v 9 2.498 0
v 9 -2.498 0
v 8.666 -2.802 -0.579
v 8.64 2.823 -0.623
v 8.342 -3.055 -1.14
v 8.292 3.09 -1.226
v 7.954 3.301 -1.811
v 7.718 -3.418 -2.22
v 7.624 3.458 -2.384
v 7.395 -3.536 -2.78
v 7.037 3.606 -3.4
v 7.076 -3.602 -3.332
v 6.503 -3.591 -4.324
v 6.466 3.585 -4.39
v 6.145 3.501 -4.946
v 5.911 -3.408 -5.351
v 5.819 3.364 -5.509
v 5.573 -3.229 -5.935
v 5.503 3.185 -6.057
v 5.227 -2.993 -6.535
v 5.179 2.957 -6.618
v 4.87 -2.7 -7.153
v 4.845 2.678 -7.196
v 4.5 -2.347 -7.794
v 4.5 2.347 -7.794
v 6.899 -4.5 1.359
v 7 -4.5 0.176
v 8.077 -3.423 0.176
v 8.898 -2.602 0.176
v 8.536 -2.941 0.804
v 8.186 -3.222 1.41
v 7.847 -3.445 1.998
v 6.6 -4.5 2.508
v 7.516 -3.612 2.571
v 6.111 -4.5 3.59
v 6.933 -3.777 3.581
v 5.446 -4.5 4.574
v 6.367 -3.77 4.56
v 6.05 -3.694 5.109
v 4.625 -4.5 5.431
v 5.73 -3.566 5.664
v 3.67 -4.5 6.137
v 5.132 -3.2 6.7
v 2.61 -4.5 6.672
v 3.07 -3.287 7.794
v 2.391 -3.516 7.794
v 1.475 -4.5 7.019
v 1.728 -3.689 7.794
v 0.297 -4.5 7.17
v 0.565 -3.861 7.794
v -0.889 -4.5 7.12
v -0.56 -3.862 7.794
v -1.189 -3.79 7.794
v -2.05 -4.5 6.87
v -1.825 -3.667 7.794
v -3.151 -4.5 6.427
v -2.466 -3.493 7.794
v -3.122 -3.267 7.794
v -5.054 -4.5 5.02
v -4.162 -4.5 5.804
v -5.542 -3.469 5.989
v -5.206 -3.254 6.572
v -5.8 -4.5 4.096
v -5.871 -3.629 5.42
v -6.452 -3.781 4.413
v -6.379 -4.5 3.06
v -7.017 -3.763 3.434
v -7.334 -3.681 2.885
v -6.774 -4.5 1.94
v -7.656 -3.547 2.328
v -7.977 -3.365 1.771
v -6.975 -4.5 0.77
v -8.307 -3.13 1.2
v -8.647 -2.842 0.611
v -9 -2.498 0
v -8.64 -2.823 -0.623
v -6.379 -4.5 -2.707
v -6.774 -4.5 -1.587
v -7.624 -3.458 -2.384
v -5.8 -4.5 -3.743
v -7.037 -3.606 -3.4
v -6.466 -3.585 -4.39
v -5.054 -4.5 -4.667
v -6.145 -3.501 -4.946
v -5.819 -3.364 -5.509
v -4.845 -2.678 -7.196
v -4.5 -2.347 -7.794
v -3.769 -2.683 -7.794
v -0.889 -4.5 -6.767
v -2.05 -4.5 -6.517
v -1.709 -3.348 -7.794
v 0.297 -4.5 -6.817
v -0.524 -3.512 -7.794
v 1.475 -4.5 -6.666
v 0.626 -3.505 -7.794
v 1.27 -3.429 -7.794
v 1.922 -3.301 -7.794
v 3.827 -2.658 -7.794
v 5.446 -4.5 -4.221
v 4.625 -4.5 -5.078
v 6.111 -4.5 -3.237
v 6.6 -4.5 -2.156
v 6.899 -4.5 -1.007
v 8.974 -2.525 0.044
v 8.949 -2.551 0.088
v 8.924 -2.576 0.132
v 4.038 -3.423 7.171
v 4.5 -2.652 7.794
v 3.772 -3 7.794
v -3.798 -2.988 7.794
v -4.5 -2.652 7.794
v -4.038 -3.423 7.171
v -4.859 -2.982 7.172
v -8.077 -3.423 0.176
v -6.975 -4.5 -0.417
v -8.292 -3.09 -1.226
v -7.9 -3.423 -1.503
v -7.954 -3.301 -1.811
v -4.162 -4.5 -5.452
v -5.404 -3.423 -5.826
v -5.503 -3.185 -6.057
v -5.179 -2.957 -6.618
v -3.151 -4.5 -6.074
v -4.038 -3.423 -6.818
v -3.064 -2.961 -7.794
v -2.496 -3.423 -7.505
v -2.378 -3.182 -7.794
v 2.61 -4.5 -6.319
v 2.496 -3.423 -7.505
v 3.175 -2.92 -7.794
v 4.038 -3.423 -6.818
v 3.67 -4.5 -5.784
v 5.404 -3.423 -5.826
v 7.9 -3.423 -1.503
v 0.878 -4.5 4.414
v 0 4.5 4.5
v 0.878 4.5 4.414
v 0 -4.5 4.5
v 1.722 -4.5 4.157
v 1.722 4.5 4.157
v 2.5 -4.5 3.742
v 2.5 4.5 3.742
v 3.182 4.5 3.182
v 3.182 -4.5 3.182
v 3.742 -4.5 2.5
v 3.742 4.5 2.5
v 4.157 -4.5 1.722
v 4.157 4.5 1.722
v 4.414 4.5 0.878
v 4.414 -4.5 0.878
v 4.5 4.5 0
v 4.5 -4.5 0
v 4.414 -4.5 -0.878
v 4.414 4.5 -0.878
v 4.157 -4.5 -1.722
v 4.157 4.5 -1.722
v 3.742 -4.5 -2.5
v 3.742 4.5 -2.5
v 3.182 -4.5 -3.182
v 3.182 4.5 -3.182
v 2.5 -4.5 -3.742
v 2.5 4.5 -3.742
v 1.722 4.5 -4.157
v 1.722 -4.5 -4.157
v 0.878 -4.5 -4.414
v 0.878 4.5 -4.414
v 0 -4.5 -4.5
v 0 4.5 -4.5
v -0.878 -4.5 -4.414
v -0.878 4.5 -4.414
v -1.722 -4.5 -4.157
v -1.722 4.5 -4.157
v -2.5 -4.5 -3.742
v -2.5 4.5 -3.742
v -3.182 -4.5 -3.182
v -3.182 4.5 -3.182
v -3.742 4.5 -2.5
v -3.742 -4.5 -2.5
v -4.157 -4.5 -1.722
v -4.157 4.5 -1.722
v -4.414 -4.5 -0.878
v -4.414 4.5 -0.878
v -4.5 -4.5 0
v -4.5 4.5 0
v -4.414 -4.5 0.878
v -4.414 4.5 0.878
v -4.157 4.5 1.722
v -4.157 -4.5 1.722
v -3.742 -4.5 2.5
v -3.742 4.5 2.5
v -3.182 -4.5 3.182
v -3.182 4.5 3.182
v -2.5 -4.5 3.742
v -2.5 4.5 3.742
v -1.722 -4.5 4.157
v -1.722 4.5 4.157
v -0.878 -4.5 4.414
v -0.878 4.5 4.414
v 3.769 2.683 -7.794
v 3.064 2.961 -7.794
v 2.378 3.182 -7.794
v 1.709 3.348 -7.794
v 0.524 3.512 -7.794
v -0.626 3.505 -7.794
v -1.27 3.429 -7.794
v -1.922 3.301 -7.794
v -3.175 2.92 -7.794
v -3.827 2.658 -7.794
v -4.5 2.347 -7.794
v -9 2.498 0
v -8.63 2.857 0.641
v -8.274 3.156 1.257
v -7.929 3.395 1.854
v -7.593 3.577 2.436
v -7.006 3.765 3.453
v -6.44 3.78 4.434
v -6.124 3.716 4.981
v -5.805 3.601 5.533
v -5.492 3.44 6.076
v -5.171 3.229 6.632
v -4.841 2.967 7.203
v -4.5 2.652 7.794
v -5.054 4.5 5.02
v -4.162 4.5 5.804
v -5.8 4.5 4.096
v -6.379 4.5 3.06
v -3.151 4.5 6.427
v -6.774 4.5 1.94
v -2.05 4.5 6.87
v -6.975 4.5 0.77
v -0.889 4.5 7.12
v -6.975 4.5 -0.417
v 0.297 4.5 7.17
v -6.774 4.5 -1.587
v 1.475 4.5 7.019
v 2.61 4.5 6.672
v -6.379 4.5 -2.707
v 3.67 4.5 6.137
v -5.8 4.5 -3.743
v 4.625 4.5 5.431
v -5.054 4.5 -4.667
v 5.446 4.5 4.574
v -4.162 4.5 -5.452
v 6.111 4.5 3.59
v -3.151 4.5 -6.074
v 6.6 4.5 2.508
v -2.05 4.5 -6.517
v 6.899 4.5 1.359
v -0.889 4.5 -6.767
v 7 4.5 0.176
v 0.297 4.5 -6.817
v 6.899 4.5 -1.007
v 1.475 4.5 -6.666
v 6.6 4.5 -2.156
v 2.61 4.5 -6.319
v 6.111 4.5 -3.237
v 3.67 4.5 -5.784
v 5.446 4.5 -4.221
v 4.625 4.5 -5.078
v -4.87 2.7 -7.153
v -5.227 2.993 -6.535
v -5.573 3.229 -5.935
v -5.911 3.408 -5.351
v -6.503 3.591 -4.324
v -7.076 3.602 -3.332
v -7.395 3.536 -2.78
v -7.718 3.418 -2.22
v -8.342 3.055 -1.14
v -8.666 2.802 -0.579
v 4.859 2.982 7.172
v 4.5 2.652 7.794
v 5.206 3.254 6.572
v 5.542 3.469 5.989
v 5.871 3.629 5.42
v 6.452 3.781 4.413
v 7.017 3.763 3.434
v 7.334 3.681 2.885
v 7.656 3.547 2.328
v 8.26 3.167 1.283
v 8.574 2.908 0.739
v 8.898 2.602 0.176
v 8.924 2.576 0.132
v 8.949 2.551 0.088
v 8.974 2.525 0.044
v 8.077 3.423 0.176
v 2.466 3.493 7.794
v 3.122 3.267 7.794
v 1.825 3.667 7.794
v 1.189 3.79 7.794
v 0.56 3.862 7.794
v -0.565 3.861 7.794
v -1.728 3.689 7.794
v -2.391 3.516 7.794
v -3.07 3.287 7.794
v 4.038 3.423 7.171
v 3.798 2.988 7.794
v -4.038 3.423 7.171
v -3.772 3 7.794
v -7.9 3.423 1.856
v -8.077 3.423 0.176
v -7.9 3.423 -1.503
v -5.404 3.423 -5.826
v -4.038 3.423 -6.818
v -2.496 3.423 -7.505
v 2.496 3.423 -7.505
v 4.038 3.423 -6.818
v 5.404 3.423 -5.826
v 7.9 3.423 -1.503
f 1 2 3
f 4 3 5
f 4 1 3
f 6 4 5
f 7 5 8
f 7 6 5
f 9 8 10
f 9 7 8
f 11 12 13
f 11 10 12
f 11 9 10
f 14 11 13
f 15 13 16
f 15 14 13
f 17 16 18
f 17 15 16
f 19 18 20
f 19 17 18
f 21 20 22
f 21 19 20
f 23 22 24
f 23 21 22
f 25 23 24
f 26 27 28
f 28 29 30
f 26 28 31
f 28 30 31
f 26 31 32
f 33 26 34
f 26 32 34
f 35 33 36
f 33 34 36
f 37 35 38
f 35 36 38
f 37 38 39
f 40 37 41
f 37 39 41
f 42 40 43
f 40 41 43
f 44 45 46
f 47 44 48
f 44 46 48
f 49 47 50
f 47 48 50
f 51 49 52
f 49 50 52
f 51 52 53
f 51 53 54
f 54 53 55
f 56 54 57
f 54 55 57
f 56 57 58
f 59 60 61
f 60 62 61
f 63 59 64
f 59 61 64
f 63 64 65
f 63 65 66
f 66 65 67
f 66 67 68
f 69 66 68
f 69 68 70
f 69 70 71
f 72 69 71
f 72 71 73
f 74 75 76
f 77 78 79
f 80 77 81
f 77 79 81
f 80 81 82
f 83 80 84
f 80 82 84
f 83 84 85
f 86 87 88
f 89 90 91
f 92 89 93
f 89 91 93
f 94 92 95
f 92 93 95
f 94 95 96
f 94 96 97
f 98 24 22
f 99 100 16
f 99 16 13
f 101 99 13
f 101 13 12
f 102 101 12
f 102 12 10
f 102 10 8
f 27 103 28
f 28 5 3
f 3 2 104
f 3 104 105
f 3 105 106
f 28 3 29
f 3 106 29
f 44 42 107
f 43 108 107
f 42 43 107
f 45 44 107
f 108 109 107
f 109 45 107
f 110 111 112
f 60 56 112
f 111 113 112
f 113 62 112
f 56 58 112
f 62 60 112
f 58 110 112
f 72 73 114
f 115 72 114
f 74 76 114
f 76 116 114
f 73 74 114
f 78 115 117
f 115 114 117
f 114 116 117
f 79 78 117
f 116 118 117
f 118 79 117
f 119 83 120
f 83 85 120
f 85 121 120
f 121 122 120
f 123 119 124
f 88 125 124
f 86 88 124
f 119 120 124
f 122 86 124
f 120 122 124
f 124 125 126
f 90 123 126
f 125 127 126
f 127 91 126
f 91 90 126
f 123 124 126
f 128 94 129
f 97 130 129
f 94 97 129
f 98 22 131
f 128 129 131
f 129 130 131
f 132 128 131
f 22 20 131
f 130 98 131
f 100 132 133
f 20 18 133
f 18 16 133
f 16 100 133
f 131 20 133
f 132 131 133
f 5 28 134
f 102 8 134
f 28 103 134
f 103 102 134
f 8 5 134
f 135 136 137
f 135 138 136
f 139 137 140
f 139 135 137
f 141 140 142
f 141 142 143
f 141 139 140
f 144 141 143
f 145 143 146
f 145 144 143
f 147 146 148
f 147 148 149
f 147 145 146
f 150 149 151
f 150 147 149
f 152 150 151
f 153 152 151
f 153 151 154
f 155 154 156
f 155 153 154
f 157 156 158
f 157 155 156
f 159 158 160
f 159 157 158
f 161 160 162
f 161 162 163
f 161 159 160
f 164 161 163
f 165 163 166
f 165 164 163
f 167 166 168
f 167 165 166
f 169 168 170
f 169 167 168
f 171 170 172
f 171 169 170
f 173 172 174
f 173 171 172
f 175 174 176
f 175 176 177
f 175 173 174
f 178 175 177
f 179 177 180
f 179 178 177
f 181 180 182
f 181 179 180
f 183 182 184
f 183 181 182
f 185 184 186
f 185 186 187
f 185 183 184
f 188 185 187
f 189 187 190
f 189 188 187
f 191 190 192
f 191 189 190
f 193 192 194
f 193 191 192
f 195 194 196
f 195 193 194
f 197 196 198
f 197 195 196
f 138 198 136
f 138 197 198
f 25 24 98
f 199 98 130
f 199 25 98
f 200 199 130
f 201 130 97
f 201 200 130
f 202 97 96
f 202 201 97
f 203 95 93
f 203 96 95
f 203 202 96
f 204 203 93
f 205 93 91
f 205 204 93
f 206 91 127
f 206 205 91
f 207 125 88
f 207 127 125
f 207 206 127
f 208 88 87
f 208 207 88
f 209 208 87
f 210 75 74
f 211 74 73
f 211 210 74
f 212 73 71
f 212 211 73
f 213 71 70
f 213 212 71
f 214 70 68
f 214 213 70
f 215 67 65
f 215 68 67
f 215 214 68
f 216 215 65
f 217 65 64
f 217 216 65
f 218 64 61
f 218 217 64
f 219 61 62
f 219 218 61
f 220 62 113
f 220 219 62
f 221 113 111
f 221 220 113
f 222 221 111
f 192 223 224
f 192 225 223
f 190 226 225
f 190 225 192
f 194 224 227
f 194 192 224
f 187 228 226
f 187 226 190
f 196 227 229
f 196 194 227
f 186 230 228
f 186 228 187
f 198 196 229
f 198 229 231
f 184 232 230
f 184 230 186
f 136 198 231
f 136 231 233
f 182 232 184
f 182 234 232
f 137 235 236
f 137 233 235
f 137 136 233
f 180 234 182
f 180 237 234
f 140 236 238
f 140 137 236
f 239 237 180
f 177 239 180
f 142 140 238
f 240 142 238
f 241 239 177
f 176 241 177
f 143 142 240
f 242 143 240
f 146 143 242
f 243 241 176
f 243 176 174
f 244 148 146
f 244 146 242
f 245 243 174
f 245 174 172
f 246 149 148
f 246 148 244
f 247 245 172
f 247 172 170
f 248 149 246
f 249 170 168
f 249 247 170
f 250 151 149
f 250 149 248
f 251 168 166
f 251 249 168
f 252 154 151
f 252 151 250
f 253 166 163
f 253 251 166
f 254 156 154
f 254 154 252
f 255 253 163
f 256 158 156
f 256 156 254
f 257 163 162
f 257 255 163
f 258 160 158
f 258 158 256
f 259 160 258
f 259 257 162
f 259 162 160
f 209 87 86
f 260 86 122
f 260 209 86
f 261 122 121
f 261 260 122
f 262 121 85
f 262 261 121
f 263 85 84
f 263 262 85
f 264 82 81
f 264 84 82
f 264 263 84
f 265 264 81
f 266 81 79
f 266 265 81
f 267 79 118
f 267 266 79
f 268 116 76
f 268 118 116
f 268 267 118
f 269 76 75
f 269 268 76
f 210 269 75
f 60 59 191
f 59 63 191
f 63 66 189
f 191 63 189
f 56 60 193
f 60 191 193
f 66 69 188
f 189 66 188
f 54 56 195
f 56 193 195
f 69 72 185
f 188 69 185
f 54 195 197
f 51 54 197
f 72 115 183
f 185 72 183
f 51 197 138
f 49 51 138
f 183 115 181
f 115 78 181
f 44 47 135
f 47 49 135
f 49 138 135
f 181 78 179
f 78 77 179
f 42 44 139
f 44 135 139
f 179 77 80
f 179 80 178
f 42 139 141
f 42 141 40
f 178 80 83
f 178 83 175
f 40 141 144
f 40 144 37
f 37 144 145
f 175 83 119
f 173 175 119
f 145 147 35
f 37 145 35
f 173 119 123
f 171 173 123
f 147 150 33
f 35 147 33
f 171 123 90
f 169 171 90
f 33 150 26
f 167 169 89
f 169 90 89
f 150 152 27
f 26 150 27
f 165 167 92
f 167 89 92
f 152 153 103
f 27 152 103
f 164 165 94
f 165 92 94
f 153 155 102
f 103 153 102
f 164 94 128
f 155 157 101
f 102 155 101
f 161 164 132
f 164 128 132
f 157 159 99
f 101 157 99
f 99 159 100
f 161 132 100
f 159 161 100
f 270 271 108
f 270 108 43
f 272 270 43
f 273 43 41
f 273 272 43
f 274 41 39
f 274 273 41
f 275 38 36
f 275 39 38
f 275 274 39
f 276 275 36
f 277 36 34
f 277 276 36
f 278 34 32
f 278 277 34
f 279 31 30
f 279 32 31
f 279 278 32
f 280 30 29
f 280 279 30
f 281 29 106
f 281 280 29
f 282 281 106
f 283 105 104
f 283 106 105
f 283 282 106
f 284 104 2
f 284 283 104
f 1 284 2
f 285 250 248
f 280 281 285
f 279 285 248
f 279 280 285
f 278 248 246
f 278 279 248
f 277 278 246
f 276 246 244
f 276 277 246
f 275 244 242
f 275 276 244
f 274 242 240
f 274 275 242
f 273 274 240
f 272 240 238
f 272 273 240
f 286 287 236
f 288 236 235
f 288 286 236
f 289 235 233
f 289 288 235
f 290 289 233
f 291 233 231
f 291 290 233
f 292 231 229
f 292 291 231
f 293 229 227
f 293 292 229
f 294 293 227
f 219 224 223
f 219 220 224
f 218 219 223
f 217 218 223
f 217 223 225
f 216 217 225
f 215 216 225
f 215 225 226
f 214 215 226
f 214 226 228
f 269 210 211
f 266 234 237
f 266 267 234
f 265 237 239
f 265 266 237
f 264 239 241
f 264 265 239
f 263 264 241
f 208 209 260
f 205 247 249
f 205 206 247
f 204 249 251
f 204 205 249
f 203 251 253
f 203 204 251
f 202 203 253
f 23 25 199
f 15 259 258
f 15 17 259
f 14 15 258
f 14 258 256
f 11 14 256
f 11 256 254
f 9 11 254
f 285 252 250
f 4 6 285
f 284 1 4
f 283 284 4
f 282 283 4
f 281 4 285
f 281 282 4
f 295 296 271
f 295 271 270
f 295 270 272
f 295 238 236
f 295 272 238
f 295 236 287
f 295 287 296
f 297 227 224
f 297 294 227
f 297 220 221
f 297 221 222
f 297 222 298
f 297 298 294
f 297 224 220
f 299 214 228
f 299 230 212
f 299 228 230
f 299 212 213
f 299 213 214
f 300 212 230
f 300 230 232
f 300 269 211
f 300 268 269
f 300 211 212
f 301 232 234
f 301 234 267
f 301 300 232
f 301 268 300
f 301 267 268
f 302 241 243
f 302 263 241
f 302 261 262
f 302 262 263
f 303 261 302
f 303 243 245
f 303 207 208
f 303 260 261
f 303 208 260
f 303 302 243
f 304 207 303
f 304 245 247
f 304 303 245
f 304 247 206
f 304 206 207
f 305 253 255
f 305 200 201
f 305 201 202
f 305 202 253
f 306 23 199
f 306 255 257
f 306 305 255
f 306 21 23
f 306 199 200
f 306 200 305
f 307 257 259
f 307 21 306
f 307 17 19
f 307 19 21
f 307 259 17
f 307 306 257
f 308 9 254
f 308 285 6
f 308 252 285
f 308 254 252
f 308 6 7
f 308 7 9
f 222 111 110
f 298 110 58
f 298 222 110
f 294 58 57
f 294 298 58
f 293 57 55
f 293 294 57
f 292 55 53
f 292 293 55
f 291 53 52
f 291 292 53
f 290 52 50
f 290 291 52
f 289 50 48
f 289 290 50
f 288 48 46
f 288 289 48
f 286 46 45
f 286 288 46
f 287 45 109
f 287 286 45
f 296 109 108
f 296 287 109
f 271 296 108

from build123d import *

# Parameters (mm, degrees)
SKETCH1_R           = 4.5
BOSS_EXTRUDE1_DEPTH = 4.5
SKETCH2_OUTSIDE_W   = 43.092
SKETCH2_OUTSIDE_H   = 40.68
SKETCH2_OUTSIDE_R   = 7
CUT_EXTRUDE2_DEPTH  = 9
CUT_EXTRUDE2_TAPER  = 45


with BuildPart() as part:
    # Sketch1 → Boss-Extrude1 (new body, symmetric)
    with BuildSketch(Plane(origin=(0, 0, 0), x_dir=(1, 0, 0), z_dir=(0, 1, 0))):
        Polygon((-4.5, -7.794228634), (4.5, -7.794228634), (9, 0), (4.5, 7.794228634), (-4.5, 7.794228634), (-9, 0), align=None)
        with Locations(Location((0, 0, 0), (0, 0, 270))):  # turned: the seam where the file's is
            Circle(SKETCH1_R, mode=Mode.SUBTRACT)
    extrude(amount=BOSS_EXTRUDE1_DEPTH, both=True)

    # Sketch2 outside → Cut-Extrude2 (cut)
    with BuildSketch(Plane(origin=(0, 4.5, 0), x_dir=(1, 0, 0), z_dir=(0, 1, 0))):
        Rectangle(SKETCH2_OUTSIDE_W, SKETCH2_OUTSIDE_H)
        with Locations((0, -0.176410187)):
            Circle(SKETCH2_OUTSIDE_R, mode=Mode.SUBTRACT)
    cut_extrude2 = extrude(amount=-CUT_EXTRUDE2_DEPTH, taper=CUT_EXTRUDE2_TAPER, mode=Mode.SUBTRACT)

    # Mirror4: Cut-Extrude2 across plane
    add(cut_extrude2.mirror(Plane.ZX), mode=Mode.SUBTRACT)


solid = part.part
